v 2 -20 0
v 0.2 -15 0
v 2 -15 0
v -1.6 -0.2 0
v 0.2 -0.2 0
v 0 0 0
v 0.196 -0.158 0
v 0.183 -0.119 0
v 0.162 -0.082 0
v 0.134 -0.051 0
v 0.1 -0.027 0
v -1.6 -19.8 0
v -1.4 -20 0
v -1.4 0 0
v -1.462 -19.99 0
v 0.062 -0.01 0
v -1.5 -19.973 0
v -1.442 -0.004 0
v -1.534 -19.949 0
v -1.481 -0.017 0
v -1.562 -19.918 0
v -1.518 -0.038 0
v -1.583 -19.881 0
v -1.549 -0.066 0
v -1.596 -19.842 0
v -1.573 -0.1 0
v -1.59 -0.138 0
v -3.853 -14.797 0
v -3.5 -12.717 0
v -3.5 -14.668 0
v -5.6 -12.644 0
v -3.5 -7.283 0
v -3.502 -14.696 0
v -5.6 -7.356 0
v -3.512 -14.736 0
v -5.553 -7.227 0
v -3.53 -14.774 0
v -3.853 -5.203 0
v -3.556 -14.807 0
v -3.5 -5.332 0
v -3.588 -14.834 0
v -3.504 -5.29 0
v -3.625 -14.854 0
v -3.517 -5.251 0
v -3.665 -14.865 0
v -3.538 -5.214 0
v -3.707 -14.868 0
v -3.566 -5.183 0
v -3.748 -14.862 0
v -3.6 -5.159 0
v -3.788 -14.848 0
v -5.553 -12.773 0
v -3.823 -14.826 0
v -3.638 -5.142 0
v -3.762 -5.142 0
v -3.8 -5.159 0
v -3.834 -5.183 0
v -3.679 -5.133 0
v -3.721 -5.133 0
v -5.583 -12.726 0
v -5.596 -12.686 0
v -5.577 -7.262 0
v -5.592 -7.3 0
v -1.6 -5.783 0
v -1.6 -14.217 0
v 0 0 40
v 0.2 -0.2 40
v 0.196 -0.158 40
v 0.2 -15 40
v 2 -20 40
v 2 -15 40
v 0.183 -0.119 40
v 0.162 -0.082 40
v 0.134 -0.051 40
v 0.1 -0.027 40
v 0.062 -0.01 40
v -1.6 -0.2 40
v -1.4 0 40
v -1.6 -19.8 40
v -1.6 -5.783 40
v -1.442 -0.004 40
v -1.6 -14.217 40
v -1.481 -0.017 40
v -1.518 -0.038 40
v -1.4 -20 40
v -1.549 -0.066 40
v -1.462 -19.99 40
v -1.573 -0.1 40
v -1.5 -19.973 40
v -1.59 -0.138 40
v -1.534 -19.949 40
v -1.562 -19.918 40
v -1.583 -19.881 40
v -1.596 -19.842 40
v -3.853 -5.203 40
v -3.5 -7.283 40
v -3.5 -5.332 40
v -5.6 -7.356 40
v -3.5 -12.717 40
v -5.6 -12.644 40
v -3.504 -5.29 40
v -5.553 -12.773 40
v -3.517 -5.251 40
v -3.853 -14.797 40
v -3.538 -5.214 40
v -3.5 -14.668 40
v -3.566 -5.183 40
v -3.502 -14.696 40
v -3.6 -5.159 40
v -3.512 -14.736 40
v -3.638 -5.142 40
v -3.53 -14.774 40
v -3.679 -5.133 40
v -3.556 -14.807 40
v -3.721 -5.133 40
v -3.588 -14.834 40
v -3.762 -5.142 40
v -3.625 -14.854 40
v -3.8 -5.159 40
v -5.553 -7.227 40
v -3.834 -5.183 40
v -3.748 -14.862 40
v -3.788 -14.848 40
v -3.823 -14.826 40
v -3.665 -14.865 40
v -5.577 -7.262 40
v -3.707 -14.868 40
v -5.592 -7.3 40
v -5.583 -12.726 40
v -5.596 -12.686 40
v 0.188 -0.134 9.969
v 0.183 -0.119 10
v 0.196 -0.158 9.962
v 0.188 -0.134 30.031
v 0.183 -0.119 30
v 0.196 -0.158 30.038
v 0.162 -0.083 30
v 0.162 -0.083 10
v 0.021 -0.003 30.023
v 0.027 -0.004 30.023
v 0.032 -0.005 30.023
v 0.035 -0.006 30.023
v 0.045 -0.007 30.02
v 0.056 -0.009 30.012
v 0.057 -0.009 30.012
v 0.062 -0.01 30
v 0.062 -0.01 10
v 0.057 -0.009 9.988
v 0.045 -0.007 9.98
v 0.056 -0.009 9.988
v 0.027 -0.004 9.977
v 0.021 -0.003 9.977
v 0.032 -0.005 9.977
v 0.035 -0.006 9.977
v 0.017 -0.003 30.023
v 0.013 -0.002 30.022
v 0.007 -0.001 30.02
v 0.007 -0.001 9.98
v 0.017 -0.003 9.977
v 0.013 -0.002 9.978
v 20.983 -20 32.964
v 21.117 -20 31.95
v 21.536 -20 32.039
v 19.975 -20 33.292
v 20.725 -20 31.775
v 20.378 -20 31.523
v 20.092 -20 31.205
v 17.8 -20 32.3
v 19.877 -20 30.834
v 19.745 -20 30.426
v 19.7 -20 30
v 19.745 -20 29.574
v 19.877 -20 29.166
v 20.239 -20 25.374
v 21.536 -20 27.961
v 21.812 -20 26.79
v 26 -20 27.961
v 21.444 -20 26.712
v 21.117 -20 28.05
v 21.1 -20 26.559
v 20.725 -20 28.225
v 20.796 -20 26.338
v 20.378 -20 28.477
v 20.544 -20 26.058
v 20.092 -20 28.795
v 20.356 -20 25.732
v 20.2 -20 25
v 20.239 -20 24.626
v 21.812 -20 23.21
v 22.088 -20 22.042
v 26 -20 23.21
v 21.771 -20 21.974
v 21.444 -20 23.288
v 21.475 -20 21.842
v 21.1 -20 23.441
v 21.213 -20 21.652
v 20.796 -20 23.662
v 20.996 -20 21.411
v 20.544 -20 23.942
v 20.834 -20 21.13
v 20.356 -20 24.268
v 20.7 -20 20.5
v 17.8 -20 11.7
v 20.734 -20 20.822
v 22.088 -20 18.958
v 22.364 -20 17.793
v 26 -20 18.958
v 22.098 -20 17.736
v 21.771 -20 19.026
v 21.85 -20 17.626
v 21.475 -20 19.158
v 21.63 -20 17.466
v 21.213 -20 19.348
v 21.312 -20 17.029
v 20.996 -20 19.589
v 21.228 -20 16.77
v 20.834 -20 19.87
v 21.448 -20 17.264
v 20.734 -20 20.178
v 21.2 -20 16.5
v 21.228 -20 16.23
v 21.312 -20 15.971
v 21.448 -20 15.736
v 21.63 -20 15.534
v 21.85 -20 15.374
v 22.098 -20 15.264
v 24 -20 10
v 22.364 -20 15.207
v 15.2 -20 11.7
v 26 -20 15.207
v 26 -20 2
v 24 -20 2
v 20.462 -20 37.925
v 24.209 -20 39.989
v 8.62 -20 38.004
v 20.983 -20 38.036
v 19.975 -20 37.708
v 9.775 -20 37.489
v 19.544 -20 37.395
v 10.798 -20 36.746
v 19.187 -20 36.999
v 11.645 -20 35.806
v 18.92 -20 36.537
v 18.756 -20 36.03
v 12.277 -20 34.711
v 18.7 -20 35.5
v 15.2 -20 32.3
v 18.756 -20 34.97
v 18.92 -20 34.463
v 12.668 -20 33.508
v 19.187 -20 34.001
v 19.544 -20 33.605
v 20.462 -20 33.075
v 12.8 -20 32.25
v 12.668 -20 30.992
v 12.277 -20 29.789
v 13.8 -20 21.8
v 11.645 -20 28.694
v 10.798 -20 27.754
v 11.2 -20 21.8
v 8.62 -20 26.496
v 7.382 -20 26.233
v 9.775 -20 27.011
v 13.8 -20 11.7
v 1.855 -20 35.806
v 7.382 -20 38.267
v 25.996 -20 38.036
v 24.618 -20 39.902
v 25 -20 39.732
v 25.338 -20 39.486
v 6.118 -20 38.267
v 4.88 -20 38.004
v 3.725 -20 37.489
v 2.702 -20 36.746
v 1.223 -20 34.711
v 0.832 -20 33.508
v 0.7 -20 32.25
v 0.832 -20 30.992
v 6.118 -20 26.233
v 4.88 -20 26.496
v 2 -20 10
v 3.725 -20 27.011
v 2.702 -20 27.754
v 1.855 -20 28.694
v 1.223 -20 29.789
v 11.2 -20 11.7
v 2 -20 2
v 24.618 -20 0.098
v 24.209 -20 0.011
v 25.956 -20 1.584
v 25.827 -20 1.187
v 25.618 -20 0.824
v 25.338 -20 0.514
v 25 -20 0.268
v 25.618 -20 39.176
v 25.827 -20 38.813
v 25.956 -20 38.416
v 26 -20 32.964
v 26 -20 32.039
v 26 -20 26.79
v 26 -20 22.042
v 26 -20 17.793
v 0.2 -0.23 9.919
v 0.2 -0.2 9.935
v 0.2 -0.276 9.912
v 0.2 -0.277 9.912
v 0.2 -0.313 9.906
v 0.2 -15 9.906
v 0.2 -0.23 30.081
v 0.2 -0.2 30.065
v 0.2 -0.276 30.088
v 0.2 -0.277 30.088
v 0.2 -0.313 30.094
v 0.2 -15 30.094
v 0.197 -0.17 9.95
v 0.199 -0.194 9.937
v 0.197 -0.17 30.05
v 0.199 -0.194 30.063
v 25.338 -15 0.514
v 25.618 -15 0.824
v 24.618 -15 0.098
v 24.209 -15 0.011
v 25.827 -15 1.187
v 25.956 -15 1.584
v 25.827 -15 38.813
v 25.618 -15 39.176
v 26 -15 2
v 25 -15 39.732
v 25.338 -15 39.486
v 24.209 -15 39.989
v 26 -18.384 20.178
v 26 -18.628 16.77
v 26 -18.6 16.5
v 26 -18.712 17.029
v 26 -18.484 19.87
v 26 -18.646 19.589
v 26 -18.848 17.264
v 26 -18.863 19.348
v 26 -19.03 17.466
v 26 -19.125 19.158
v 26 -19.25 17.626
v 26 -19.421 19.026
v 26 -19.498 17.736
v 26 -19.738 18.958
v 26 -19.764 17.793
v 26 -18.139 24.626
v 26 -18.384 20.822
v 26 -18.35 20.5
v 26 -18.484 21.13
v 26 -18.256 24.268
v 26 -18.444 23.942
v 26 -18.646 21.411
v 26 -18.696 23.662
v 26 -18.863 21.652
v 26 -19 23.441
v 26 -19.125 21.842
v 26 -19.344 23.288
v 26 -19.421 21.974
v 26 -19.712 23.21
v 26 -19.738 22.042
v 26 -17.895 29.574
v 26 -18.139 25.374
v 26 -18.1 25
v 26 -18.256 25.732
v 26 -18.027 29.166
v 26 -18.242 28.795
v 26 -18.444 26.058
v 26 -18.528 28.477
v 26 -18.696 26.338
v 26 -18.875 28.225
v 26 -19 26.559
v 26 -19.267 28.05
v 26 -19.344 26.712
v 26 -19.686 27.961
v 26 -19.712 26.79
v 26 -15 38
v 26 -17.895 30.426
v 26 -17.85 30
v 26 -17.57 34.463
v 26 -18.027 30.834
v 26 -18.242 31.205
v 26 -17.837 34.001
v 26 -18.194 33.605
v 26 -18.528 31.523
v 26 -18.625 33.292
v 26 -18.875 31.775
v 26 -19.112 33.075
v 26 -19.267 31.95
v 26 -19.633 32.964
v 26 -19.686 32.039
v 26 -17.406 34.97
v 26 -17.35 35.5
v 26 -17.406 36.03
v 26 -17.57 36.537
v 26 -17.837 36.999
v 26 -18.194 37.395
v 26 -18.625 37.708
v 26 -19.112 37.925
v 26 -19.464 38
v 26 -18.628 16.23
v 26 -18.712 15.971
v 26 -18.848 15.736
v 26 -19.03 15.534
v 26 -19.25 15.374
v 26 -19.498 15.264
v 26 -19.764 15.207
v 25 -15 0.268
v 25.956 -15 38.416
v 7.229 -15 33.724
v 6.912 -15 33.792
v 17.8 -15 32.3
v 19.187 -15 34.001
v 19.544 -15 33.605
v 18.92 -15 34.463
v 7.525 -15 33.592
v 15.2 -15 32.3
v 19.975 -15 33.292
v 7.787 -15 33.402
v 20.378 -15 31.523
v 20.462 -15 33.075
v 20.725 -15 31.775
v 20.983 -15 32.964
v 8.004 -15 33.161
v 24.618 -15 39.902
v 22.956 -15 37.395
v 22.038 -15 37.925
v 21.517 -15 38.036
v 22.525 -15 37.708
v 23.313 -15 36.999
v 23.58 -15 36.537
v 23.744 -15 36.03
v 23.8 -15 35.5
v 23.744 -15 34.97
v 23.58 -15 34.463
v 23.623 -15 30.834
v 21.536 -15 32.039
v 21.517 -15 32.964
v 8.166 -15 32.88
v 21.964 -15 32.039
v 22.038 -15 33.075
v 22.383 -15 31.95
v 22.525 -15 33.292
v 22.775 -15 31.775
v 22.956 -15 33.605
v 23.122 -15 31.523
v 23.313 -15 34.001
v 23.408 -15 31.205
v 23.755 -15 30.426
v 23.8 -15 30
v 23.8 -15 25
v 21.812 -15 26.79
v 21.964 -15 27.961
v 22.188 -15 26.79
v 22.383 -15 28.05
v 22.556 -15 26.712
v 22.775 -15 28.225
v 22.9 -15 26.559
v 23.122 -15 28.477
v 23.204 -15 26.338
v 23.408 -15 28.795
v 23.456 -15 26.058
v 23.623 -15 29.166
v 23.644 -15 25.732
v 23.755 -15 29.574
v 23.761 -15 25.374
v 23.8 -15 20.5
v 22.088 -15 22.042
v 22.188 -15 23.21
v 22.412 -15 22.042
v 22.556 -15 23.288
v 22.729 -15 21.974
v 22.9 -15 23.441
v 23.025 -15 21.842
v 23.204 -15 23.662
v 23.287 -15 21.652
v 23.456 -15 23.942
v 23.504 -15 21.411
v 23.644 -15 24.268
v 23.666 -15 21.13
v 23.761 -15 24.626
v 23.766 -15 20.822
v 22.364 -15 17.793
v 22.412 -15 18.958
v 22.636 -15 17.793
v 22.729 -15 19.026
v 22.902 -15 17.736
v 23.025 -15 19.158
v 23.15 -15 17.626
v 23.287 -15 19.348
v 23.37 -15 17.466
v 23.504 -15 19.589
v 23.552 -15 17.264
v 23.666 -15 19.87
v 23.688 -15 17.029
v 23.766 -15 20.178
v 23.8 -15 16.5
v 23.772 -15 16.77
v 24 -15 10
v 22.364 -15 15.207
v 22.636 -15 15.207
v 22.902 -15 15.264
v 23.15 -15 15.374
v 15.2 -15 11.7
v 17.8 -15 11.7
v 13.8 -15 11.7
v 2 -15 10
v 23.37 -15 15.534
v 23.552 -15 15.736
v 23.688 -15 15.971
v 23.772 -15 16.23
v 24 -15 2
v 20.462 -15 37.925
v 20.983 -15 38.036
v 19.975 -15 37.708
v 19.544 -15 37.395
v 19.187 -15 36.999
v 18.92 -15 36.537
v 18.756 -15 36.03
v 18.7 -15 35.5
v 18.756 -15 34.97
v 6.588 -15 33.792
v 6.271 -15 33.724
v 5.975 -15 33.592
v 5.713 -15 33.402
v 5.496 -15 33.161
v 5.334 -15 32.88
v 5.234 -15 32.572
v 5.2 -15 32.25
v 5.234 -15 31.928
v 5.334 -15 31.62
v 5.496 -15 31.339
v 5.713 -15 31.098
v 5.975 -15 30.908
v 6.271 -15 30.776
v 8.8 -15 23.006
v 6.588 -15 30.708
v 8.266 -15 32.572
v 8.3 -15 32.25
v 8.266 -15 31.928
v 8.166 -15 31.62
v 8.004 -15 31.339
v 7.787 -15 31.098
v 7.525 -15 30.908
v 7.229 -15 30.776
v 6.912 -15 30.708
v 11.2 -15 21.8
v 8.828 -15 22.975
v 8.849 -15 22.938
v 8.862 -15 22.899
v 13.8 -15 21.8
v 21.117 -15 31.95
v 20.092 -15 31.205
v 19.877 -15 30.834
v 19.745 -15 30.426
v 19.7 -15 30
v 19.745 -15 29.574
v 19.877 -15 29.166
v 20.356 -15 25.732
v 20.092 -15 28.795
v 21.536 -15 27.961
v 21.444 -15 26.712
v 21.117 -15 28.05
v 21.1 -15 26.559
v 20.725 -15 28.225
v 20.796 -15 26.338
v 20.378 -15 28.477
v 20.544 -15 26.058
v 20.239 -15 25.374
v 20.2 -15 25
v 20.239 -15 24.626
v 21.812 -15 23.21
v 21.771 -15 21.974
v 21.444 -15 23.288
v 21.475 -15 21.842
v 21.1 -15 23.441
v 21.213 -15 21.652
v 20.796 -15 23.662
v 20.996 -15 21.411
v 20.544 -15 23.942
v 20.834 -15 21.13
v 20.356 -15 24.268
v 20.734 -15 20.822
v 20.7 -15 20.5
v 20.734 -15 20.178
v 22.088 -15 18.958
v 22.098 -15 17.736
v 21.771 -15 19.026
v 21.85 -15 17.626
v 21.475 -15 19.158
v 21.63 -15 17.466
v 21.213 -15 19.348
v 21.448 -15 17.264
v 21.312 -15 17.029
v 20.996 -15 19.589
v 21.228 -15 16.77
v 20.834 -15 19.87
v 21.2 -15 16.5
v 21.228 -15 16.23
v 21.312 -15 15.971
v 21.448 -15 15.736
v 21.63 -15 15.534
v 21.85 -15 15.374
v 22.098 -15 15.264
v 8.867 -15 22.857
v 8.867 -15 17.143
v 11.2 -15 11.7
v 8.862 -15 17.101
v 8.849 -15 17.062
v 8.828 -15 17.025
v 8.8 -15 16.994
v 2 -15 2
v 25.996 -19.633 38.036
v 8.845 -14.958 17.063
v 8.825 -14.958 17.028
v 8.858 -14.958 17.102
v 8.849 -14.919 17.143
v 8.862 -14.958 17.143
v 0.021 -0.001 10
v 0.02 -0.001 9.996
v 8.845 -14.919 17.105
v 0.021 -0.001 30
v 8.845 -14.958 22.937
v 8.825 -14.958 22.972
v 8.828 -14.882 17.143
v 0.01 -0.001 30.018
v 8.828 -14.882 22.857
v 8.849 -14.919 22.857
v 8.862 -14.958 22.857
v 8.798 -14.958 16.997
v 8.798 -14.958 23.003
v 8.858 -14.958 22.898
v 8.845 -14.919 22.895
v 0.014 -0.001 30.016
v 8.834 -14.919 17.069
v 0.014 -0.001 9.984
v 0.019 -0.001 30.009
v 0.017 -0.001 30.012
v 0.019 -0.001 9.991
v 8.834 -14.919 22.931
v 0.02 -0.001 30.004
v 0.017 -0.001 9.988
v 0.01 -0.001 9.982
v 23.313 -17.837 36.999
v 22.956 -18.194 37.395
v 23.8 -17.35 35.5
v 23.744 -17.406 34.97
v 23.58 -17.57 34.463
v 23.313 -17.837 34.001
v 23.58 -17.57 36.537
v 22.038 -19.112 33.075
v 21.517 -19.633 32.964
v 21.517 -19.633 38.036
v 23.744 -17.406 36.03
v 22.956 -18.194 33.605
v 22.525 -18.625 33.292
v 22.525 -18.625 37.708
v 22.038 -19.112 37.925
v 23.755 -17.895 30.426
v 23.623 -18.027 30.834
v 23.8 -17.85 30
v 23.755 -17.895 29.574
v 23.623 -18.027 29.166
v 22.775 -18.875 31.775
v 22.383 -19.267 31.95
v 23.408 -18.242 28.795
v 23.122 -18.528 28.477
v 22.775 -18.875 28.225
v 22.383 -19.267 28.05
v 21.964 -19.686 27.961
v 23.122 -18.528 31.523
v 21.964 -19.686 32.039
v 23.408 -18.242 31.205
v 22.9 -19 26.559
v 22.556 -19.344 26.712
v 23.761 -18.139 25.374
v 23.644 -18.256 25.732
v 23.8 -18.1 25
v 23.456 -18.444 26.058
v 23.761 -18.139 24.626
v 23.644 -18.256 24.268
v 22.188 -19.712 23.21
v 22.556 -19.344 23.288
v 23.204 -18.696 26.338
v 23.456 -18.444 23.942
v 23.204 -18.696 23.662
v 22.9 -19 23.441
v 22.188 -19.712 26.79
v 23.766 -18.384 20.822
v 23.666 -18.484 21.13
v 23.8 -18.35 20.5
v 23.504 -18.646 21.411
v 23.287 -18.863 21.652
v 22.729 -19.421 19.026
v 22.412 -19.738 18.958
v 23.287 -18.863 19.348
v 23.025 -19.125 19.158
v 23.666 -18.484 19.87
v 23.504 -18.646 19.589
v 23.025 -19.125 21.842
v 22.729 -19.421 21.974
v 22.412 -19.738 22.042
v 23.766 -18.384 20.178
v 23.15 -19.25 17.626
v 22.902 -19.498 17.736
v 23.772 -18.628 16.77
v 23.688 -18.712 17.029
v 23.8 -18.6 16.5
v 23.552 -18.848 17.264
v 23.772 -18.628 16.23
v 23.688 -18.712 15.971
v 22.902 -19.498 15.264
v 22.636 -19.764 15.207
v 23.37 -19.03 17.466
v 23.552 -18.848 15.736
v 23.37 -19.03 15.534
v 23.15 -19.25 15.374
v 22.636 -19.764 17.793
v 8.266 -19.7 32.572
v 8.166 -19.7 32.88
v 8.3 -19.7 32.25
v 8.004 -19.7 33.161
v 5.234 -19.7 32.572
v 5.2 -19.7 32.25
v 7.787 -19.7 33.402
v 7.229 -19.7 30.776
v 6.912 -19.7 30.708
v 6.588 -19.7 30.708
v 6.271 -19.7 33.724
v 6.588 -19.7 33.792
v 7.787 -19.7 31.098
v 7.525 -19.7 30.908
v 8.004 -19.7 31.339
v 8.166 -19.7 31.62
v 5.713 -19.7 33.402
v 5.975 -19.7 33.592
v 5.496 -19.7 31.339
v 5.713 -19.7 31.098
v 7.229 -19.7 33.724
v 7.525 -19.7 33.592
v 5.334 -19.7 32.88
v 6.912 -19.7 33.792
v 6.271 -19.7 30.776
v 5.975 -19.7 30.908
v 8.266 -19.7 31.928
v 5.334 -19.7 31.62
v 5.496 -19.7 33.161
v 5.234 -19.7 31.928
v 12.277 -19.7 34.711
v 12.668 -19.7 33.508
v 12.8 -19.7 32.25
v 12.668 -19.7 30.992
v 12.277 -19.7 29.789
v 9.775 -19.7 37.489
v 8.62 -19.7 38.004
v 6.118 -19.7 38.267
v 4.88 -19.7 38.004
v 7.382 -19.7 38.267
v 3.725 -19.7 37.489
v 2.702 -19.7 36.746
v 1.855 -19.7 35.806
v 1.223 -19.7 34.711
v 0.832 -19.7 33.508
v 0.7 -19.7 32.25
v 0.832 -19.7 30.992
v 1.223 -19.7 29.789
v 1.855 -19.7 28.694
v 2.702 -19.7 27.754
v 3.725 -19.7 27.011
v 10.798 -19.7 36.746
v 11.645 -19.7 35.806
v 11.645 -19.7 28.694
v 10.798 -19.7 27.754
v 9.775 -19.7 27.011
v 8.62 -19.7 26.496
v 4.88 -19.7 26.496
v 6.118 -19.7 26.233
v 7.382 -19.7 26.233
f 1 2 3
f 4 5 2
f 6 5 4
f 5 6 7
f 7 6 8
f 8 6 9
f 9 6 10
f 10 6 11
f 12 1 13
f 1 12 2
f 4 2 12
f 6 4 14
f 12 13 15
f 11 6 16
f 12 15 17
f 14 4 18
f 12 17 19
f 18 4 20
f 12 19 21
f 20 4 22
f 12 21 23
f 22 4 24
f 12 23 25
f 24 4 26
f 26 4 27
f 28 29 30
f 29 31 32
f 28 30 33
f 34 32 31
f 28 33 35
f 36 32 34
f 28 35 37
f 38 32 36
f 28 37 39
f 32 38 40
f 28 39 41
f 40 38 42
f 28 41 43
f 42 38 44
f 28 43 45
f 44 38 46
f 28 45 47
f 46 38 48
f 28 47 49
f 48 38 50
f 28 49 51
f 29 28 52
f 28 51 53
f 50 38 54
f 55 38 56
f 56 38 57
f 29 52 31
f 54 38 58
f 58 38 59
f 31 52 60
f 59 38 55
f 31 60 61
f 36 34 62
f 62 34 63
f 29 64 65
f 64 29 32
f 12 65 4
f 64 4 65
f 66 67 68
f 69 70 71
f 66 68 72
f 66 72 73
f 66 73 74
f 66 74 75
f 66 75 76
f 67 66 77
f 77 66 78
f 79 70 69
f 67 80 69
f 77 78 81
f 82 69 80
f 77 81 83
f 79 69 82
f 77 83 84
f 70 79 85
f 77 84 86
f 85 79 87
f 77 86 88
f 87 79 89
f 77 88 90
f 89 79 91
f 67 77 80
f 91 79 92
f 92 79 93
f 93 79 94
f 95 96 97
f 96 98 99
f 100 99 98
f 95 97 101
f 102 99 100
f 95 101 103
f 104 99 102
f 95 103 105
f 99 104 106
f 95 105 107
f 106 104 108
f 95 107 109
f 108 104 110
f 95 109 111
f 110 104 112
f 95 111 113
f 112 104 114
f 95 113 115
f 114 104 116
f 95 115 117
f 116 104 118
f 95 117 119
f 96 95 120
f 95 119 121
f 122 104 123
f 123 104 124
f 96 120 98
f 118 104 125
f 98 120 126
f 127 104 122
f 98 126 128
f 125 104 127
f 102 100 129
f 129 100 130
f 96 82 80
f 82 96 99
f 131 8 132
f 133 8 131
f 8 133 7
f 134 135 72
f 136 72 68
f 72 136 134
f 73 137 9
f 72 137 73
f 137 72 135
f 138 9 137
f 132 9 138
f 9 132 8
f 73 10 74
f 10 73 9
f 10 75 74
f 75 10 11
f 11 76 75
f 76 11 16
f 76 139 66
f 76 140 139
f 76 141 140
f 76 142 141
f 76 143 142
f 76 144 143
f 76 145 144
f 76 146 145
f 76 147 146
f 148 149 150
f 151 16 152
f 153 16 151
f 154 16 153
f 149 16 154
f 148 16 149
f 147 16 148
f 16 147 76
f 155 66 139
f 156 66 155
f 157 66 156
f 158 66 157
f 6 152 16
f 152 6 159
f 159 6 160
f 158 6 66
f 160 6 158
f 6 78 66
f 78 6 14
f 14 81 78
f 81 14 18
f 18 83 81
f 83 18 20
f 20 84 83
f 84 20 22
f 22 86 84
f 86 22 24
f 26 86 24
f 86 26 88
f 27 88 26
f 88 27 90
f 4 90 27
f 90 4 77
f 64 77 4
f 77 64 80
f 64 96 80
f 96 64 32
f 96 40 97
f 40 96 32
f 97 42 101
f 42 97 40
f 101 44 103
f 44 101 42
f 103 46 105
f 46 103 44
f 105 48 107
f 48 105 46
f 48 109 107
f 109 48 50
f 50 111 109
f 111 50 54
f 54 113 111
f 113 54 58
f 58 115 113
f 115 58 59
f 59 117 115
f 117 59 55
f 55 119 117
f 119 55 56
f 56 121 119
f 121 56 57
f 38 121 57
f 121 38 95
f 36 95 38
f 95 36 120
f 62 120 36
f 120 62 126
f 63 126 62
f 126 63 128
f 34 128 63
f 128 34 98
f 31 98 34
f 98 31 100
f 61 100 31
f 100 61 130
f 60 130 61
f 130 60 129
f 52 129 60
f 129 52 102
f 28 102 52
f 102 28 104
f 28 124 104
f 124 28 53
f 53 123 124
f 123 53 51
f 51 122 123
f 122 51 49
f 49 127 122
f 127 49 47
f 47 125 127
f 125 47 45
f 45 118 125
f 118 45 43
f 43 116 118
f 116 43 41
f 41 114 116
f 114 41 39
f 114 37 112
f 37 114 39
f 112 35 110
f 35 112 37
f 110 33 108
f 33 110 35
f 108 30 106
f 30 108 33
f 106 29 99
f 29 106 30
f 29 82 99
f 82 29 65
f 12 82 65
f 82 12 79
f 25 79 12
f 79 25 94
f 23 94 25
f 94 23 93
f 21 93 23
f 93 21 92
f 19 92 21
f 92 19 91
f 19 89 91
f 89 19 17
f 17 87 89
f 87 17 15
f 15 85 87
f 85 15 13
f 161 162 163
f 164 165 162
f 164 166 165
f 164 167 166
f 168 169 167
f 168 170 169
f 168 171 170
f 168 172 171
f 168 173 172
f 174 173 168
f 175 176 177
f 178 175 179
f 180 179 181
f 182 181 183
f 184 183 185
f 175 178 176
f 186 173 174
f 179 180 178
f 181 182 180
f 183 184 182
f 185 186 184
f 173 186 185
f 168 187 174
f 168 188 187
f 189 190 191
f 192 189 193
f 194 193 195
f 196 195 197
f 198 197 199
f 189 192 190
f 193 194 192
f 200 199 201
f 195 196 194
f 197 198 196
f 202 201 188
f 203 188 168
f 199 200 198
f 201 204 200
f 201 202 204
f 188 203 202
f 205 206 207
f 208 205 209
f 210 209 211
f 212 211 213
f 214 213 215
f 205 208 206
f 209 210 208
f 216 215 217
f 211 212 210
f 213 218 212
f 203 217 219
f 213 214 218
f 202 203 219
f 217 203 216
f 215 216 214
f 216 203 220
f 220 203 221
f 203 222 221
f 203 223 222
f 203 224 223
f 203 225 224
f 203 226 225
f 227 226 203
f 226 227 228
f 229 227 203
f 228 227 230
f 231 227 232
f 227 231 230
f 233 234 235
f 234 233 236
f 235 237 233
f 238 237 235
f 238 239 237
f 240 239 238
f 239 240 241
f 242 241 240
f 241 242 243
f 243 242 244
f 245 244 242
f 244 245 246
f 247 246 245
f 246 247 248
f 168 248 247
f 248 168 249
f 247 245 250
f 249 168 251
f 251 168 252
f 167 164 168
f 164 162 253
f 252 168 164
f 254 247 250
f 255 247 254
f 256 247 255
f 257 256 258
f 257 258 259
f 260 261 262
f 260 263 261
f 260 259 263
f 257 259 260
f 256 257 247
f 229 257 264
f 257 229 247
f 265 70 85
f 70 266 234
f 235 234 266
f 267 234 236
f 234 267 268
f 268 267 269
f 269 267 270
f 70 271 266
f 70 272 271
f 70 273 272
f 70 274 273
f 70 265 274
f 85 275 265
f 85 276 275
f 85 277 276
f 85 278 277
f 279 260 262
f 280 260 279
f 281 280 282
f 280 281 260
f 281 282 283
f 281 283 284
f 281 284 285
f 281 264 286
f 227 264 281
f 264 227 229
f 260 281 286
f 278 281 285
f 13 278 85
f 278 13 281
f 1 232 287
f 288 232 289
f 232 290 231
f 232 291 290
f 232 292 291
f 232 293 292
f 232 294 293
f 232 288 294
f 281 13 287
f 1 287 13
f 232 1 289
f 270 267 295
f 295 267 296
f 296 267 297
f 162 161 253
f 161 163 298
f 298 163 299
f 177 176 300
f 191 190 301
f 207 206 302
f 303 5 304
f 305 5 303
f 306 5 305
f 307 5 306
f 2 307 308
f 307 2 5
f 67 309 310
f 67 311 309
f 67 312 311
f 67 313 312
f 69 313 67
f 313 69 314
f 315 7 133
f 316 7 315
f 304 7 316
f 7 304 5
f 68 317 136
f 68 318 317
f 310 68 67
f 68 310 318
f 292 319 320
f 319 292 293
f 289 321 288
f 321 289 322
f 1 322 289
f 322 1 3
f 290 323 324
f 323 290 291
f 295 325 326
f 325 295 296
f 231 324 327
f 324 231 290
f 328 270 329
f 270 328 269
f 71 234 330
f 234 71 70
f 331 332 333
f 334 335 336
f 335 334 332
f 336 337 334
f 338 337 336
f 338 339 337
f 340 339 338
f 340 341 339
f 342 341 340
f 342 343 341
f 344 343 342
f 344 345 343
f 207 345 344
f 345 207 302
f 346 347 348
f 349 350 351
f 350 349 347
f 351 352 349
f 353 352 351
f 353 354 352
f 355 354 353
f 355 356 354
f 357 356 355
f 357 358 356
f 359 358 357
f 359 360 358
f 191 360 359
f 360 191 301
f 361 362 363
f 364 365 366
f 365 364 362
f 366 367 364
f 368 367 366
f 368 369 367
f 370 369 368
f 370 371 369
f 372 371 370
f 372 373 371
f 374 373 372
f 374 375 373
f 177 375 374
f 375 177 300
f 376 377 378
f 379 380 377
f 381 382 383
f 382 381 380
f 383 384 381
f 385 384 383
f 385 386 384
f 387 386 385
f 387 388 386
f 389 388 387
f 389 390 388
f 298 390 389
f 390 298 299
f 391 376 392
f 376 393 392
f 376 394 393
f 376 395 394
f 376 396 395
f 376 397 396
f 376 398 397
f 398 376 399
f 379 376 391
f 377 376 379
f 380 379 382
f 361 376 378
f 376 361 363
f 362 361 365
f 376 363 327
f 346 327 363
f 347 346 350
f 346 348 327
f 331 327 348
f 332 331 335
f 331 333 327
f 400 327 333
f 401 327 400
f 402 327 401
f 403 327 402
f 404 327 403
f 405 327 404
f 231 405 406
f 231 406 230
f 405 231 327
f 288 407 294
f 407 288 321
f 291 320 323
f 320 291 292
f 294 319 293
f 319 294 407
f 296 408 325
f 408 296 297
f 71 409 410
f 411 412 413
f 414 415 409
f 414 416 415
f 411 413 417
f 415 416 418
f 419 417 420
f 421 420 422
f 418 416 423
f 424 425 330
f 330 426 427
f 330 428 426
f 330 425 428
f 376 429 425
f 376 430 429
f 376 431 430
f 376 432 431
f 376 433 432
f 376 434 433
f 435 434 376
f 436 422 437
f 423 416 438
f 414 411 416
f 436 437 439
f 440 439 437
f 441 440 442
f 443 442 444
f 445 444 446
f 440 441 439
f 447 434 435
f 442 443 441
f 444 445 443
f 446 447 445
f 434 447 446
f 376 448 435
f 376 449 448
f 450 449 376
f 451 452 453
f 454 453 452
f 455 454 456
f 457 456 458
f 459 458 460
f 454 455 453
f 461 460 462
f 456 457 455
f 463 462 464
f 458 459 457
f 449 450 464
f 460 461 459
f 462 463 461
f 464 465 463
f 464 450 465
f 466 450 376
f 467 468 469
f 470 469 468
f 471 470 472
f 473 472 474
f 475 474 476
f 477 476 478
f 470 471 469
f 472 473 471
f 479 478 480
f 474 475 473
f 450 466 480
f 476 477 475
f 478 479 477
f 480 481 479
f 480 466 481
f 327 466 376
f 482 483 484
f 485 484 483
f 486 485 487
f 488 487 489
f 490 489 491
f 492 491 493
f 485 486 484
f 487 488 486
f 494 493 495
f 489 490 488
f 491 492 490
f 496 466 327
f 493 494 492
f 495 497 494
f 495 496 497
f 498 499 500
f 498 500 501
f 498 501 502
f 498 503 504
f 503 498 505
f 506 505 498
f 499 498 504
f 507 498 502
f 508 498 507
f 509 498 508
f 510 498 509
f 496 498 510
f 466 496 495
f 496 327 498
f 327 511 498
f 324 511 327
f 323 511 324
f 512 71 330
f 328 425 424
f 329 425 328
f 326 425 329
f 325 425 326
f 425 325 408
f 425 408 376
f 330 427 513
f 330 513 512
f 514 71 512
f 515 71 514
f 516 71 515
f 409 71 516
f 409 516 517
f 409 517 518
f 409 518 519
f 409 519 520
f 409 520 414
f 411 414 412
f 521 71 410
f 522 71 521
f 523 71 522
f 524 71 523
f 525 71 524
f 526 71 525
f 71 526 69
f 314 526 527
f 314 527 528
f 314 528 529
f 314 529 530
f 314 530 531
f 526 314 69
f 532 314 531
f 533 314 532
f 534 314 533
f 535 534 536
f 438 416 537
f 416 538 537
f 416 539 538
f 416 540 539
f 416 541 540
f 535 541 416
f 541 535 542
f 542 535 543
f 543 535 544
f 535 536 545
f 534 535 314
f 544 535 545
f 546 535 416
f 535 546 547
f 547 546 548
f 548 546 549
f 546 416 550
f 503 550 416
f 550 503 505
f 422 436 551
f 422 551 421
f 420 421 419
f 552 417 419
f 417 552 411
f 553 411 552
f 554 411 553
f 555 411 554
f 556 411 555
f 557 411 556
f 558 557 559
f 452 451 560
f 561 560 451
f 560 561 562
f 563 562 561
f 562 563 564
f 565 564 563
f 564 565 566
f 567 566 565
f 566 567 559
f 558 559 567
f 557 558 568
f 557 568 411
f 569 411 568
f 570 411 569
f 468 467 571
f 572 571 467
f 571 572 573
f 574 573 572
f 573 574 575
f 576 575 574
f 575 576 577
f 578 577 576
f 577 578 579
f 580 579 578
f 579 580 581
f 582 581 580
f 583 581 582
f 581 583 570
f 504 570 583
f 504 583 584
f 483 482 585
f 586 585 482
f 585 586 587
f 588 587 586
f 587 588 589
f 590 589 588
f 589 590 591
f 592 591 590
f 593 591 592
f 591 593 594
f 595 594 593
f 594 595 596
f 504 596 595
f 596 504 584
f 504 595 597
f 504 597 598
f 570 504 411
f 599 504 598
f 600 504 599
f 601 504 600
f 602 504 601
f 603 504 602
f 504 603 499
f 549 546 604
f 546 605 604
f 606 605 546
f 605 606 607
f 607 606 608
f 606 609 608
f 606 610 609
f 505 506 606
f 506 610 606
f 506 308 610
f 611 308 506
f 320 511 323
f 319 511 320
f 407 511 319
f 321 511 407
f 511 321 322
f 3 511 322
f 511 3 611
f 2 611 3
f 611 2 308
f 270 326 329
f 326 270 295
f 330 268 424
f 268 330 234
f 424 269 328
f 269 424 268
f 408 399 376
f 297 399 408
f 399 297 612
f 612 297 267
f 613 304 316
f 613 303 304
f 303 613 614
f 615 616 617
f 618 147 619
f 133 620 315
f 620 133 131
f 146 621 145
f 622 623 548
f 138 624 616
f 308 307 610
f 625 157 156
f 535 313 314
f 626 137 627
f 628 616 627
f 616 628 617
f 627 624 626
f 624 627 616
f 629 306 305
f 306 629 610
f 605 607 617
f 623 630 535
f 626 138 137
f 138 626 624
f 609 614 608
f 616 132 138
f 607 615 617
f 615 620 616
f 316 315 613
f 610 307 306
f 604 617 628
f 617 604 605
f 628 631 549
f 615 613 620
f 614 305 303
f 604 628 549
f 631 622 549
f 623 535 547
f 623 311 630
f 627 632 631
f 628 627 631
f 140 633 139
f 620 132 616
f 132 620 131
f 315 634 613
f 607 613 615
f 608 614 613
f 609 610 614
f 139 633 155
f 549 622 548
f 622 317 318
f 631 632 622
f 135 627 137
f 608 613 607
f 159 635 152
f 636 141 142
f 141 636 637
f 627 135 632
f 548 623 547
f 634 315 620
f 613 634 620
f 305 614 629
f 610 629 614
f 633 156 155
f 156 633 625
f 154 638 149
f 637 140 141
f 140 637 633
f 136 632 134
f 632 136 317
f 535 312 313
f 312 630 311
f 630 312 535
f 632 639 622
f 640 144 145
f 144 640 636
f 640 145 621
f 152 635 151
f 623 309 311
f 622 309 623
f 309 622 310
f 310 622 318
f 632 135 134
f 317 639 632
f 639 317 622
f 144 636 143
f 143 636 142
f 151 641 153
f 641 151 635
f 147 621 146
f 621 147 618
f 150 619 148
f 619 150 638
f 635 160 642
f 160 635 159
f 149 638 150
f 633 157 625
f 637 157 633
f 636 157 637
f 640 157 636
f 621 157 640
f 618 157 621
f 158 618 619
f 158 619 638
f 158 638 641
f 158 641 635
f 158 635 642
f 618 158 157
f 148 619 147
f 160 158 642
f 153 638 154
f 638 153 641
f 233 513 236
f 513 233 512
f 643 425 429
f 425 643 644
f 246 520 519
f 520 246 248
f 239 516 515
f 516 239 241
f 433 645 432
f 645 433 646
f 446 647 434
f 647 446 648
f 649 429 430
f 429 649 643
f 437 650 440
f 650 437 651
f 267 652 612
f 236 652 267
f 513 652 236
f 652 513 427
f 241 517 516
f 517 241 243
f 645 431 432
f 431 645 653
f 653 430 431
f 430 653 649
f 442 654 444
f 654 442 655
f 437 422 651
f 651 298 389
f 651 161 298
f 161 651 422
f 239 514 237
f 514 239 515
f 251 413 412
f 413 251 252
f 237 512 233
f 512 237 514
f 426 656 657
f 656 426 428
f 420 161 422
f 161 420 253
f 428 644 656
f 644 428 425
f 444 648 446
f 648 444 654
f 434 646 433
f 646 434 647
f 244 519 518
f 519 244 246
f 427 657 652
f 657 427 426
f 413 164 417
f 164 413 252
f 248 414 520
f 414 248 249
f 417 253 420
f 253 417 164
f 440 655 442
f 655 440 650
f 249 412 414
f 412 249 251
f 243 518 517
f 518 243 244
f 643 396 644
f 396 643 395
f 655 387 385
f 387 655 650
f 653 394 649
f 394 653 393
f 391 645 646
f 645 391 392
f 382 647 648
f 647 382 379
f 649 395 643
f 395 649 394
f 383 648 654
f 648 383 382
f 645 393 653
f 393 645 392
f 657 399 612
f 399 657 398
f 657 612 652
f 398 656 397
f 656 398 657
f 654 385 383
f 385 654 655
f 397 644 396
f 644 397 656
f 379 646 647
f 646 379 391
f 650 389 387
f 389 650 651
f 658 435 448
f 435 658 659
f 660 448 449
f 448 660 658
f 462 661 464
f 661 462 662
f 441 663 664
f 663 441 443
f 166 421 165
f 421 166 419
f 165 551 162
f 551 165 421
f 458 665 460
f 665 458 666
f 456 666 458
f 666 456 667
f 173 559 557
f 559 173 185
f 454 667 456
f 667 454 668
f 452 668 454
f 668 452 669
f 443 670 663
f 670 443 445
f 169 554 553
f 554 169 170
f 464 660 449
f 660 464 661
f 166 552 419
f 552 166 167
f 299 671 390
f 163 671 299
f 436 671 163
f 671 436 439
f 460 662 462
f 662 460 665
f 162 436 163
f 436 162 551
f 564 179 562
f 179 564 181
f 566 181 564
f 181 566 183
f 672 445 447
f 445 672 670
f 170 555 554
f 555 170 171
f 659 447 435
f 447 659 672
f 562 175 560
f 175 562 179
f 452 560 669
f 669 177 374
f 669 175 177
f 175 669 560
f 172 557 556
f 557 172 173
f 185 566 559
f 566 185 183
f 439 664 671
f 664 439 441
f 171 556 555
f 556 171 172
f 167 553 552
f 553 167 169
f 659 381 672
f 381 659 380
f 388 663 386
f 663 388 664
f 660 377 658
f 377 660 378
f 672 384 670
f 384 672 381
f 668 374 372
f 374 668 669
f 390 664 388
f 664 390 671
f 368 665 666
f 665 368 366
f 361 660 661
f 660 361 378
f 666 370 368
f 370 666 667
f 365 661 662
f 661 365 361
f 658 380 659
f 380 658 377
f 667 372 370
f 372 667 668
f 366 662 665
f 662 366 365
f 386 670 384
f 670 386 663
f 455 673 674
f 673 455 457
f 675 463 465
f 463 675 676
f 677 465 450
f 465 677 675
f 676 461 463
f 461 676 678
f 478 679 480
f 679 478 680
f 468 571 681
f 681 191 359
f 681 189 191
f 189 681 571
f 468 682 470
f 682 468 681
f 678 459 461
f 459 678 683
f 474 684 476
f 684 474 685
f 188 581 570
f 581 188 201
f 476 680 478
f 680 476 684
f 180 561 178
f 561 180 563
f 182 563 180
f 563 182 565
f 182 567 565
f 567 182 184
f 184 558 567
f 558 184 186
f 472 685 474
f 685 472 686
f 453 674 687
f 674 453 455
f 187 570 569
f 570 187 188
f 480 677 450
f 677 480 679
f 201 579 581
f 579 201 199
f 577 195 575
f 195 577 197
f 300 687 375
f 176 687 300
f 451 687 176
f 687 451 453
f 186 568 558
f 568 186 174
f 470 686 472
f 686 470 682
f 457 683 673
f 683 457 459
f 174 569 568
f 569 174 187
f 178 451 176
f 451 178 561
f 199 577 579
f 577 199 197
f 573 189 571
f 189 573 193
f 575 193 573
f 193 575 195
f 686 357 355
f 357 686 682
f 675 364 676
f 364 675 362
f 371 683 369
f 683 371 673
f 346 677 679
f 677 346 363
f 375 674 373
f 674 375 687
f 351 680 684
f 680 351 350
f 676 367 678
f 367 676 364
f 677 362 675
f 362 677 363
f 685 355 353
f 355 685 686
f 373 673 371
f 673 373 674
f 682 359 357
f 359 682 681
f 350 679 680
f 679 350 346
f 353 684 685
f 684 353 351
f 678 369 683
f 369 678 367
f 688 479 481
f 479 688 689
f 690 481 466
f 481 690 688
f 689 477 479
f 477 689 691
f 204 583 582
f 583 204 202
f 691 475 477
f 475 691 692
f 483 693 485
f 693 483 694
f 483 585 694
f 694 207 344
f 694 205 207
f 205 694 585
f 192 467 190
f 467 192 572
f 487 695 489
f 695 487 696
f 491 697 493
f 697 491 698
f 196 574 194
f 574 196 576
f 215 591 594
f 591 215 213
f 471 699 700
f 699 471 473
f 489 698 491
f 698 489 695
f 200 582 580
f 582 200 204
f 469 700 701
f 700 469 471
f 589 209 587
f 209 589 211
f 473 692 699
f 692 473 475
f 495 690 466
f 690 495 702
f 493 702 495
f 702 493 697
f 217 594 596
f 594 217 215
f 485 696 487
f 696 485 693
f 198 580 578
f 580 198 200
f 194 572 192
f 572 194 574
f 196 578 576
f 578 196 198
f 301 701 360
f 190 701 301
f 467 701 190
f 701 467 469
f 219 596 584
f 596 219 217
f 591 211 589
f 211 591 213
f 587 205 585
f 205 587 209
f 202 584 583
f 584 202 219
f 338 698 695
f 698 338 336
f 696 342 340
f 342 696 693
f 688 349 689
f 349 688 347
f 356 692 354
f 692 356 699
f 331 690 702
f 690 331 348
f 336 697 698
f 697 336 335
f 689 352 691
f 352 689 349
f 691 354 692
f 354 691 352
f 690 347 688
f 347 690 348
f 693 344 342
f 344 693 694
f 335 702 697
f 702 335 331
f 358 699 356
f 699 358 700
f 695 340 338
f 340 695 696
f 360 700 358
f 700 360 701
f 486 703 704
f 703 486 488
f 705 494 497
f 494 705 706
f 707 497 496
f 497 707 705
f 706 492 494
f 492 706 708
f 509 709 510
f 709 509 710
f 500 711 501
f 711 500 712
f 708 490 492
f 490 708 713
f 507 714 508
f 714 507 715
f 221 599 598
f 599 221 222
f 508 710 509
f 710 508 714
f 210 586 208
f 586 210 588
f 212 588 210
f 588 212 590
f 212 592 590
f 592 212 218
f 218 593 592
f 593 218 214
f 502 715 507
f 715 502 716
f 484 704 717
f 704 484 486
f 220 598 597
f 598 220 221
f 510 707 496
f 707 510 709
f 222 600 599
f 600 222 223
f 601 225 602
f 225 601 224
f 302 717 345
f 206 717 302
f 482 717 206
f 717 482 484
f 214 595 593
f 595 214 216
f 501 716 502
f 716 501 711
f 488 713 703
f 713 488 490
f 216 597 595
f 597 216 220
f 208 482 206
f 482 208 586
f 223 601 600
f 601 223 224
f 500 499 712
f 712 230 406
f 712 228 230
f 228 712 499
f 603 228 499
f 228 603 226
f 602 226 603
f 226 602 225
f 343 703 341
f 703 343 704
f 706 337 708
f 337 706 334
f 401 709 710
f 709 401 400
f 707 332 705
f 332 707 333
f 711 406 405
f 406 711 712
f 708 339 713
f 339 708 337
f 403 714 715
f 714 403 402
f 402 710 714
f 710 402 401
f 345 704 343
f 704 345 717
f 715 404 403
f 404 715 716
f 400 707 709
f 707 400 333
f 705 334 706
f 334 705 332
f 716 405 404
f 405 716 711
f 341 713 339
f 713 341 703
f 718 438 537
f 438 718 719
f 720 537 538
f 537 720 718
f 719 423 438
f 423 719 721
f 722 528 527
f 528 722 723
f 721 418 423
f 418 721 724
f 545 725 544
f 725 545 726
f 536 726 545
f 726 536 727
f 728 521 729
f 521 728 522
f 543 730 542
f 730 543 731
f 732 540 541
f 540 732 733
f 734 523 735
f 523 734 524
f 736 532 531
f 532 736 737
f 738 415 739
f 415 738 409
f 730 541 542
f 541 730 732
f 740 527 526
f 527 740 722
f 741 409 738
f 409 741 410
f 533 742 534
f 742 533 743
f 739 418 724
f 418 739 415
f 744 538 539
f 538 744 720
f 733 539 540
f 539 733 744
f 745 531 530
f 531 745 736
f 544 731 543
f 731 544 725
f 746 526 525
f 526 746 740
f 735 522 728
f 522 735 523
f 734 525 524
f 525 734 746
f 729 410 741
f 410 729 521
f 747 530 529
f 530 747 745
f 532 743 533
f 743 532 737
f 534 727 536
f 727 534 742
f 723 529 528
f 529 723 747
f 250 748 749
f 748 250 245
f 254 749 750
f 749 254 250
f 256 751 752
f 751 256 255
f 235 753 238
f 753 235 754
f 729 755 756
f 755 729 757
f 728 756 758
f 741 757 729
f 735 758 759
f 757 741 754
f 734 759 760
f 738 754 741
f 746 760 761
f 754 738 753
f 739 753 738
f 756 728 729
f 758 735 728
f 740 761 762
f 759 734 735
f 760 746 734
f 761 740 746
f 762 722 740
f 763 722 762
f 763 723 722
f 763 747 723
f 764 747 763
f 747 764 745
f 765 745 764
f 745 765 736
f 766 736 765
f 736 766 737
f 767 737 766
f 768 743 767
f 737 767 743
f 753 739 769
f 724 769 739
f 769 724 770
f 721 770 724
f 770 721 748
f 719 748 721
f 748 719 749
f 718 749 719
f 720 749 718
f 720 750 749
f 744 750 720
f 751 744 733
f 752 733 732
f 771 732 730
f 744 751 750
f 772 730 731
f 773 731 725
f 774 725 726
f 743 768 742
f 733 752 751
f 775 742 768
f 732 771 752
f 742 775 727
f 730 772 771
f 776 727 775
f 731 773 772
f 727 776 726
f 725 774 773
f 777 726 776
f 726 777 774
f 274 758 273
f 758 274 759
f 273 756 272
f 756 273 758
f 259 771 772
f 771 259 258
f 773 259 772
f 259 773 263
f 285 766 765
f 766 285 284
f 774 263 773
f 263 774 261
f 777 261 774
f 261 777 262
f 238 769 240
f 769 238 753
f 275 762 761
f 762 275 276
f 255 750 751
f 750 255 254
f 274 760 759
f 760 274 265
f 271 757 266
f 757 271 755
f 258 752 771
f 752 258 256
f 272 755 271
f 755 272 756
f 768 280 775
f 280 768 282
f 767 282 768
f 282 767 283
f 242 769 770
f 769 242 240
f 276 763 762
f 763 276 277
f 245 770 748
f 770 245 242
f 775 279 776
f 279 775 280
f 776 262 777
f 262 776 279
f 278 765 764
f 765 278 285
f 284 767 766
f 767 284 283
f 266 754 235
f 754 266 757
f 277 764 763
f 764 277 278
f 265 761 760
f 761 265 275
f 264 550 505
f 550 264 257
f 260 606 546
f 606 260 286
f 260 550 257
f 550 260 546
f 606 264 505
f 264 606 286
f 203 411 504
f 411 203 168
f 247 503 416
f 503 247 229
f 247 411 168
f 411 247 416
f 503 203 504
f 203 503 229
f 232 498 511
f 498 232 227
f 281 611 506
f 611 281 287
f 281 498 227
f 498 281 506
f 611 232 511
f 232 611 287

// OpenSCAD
// ////////////////////////////////////////////////////////////
//
// Ender 3 Tool Holder
//
// A simple tool holder that mounts onto the extruded aluminium
// profile, fits neatly to the top bar behind the right hand
// vertical brace, above the power supply.
//
// Copyright 2018 Kevin F. Quinn
//
// This work is licensed under the Creative Commons
// Attribution-ShareAlike 4.0 International License. To view a
// copy of the license, visit
// https://creativecommons.org/licenses/by-sa/4.0/
//
// History
// 2018-08-05 1.0 Initial publication

/* Printing notes
 * --------------
 *
 * First, refine the profile_clearance value to get a nice snug
 * fit for the extrusion profile mating section. Select the
 * "profile only" piece to print and check quickly before
 * committing to printing the holder.
 *
 * The "small" variant holds all the supplied tools apart from
 * the spatula.
 *
 * The "large" variant also has capacity for the spatula.
 *
 * In both cases, print on its side with the profile face
 * sitting on the bed - no supports needed.
 */


// Select which part to generate - which kind of holder, or the profile-only test part
part=0; // [0:small - without spatula, 1:large - with spatula, 2:profile only]
// Clearance distance around the various tool holes
tool_clearance=0.3;
// Clearance distance for the extrusion profile - print the "profile only" piece to test quickly
profile_clearance=0.2;
// Corner radius of top part
corner_radius=2.0;
// Amount of extrusion profile to remove to accommodate the end cap (or set to 0 and just turn the end cap...)
holder_cap_size=0;

/* [Hidden] */

$fn=30;

PART_SMALL=0;
PART_LARGE=1;
PART_PROFILE=2;

keys_d=[4.5,3.5,3.0,2.5,2.0];
keys_size=1.0;
driver_dia=2.5;
driver_size=11.5;
spanners_w=[9.5,20];
spanner_d=2.0;
spatula_w1=38;
spatula_w2=24;
spatula_d1=1.0;
spatula_d2=8.0;
spatula_size_w=20;
spatula_size_d=15;
cutters_w=8.0;
cutters_d=22.0;

holder_w=40;
holder_d=[26,42,40];
holder_t=5;

roundness=0.2;

profile_size=20.0;
profile_edge_thickness=2.0;

c=profile_clearance;
c2=c*sqrt(2);

profile=[
  [0.0, -profile_edge_thickness],
  [0.0,0.0],
  [5.5,0.0],
  [7.0,1.5],
  [4.5,1.5],
  [7.0,4.0],
  [13.0,4.0],
  [15.5,1.5],
  [13.0,1.5],
  [14.5,0.0],
  [20.0,0.0],
  [20.0, -profile_edge_thickness]
];

offset=[
  [0.0,0.0],
  [0.0,-c],
  [c2,-c],
  [c2,c],
  [c2,c],
  [c2,-c],
  [-c2,-c],
  [-c2,c],
  [-c2,c],
  [-c2,-c],
  [0.0,-c],
  [0.0,0.0]
];

profile1=[
  for (p=[0:1:len(profile)-1]) [profile[p][0]+offset[p][0],profile[p][1]+offset[p][1]]
];

sp=0.1;
/*
5.5  1.5  6  1.5  5.5
______         _______
|   __\       /__    | 1.5
|   \2.5      2.5/   |
| |\ \          / /| | 2.5
\ | \ \________/ / | /
 \|  \    6     /  |/
...
 */

module slot_profile(h,x=0) {
  //color("green") linear_extrude(height=2) polygon(profile0);
  translate([0,0,profile_size])
  rotate(a=-90,v=[1,0,0])
  rotate(a=90,v=[0,0,1])
  translate([0,profile_edge_thickness-roundness,0])
  difference() {
    linear_extrude(height=h)
    offset(r=roundness) offset(delta=-roundness)
    //offset(r=-roundness) offset(delta=roundness)
    polygon(profile1);
    translate([0,-roundness,-sp])
    cube([profile_size,profile_size,x+sp]);
  }
}

function sum(n,s,k)=(n>0)?sum(n-1,s+k[n],k):(s+k[0]);

module blank_toolholder(depth) {
  slot_profile(holder_w,holder_cap_size);
  // main plate
  hull() {
    translate([0,0,profile_size-holder_t])
    cube([profile_edge_thickness,holder_w,holder_t]);
    for (y=[corner_radius,holder_w-corner_radius])
    translate([depth-corner_radius,y,profile_size-holder_t])
    cylinder(r=corner_radius,h=holder_t);
  }
  // Support brace underneath
  hull() {
    for (z=[roundness,profile_size-holder_t])
    for (y=[holder_w/4,holder_w*3/4])
    translate([0,y,z]) sphere(r=roundness);
    for (y=[holder_w*3/7,holder_w*4/7])
    translate([depth/3,y,profile_size-holder_t]) sphere(r=roundness);
  }
}

module hex_hole(d,l) {
  cylinder(d=d+tool_clearance*2,h=profile_size+sp*2);
  translate([0,0,profile_size])
  rotate(a=90,v=[0,1,0])
  cylinder(d=d+tool_clearance*2,h=2.5+d/2+sp);
}

module spatula_hole() {
  d=spatula_d1+tool_clearance*2;
  translate([-spatula_w1/2-tool_clearance,-spatula_d1/2-tool_clearance,-sp])
  cube([spatula_w1+tool_clearance*2,spatula_d1+tool_clearance*2,profile_size+sp*2]);
  hull() {
    translate([-spatula_w2/2-tool_clearance-d/2,0-sp])
    cylinder(d=d,h=profile_size+sp*2);
    translate([-spatula_w2/2-tool_clearance+spatula_d2/2-d/2,spatula_d2/2+tool_clearance-d/2,-sp])
    cylinder(d=d,h=profile_size+sp*2);
    translate([-spatula_w2/2-tool_clearance+spatula_d2/2-d/2,-spatula_d2/2-tool_clearance+d/2,-sp])
    cylinder(d=d,h=profile_size+sp*2);
    translate([spatula_w2/2+tool_clearance+d/2,0,-sp])
    cylinder(d=d,h=profile_size+sp*2);
    translate([spatula_w2/2+tool_clearance-spatula_d2/2+d/2,spatula_d2/2+tool_clearance-d/2,-sp])
    cylinder(d=d,h=profile_size+sp*2);
    translate([spatula_w2/2+tool_clearance-spatula_d2/2+d/2,-spatula_d2/2-tool_clearance+d/2,-sp])
    cylinder(d=d,h=profile_size+sp*2);
  }
  translate([0,0,profile_size-tool_clearance])
  scale([1.0,spatula_size_d/spatula_size_w,1.0])
  cylinder(d=spatula_size_w+tool_clearance*2,h=tool_clearance+sp);
}

module toolholder() {
  difference() {
    blank_toolholder(depth=holder_d[part]);
    // Hex key slots
    if (part==PART_SMALL) {
      // Along back edge
      for (key=[0:1:4]) {
        translate([holder_d[part]-2.5-keys_d[key]/2,holder_w-sum(key,0,keys_d)-key*2,-sp])
        hex_hole(d=keys_d[key]);
      }
    } else {
      // Along right hand side edge
      for (key=[0:1:4]) {
        translate([holder_d[part]-(sum(key,0,keys_d)+key*2)-spatula_size_d-profile_edge_thickness,2.5+keys_d[key]/2,-sp])
        rotate(a=-90,v=[0,0,1])
        hex_hole(d=keys_d[key]);
      }
    }
    
    // screw driver hole
    translate([driver_size/2+profile_edge_thickness/2,
               ((part==PART_LARGE)?holder_w/2:holder_w-driver_size/2-profile_edge_thickness),-sp]) {
      cylinder(d=driver_dia+tool_clearance*2,h=profile_size+sp*2);
      translate([0,0,profile_size+sp-tool_clearance])
      cylinder(d=driver_size+tool_clearance*2,h=tool_clearance+sp);
    }

    // Spanners
    if (part==PART_SMALL) {
      for (spanner=[0:1:1]) {
        translate([driver_size+(spanner_d+2)*spanner-tool_clearance,cutters_w+4-tool_clearance,-sp])
        cube([spanner_d+tool_clearance*2,spanners_w[spanner]+tool_clearance*2,profile_size+sp*2]);
      }
    } else {
      translate([driver_size,(holder_w-(profile_edge_thickness*2+cutters_w+spanner_d)),-sp])
      rotate(a=-30,v=[0,0,1])
      cube([spanners_w[0]+tool_clearance*2,spanner_d+tool_clearance*2,profile_size+sp*2]);

      translate([profile_edge_thickness*2,(max(keys_d)+profile_edge_thickness),-sp])
      rotate(a=30,v=[0,0,1])
      cube([spanners_w[1]+tool_clearance*2,spanner_d+tool_clearance*2,profile_size+sp*2]);
    }

    // Cutters
    translate([((part==PART_LARGE)?(holder_d[part]-spatula_size_d)/2-cutters_d/2:holder_d[part]/2-cutters_d/2),
    ((part==PART_LARGE)?(holder_w-profile_edge_thickness-cutters_w):profile_edge_thickness),-sp])
    cube([cutters_d,cutters_w,profile_size+sp*2]);

    // Spatula - only on large version
    if (part==PART_LARGE) {
      translate([holder_d[part]-spatula_size_d/2-profile_edge_thickness,holder_w/2,0])
      rotate(a=70,v=[0,0,1])
      spatula_hole();
    }

  }
}

if (part==PART_PROFILE) {
  rotate(a=90,v=[1,0,0])
  slot_profile(10);
} else {
  rotate(a=90,v=[1,0,0])
  toolholder();
}
